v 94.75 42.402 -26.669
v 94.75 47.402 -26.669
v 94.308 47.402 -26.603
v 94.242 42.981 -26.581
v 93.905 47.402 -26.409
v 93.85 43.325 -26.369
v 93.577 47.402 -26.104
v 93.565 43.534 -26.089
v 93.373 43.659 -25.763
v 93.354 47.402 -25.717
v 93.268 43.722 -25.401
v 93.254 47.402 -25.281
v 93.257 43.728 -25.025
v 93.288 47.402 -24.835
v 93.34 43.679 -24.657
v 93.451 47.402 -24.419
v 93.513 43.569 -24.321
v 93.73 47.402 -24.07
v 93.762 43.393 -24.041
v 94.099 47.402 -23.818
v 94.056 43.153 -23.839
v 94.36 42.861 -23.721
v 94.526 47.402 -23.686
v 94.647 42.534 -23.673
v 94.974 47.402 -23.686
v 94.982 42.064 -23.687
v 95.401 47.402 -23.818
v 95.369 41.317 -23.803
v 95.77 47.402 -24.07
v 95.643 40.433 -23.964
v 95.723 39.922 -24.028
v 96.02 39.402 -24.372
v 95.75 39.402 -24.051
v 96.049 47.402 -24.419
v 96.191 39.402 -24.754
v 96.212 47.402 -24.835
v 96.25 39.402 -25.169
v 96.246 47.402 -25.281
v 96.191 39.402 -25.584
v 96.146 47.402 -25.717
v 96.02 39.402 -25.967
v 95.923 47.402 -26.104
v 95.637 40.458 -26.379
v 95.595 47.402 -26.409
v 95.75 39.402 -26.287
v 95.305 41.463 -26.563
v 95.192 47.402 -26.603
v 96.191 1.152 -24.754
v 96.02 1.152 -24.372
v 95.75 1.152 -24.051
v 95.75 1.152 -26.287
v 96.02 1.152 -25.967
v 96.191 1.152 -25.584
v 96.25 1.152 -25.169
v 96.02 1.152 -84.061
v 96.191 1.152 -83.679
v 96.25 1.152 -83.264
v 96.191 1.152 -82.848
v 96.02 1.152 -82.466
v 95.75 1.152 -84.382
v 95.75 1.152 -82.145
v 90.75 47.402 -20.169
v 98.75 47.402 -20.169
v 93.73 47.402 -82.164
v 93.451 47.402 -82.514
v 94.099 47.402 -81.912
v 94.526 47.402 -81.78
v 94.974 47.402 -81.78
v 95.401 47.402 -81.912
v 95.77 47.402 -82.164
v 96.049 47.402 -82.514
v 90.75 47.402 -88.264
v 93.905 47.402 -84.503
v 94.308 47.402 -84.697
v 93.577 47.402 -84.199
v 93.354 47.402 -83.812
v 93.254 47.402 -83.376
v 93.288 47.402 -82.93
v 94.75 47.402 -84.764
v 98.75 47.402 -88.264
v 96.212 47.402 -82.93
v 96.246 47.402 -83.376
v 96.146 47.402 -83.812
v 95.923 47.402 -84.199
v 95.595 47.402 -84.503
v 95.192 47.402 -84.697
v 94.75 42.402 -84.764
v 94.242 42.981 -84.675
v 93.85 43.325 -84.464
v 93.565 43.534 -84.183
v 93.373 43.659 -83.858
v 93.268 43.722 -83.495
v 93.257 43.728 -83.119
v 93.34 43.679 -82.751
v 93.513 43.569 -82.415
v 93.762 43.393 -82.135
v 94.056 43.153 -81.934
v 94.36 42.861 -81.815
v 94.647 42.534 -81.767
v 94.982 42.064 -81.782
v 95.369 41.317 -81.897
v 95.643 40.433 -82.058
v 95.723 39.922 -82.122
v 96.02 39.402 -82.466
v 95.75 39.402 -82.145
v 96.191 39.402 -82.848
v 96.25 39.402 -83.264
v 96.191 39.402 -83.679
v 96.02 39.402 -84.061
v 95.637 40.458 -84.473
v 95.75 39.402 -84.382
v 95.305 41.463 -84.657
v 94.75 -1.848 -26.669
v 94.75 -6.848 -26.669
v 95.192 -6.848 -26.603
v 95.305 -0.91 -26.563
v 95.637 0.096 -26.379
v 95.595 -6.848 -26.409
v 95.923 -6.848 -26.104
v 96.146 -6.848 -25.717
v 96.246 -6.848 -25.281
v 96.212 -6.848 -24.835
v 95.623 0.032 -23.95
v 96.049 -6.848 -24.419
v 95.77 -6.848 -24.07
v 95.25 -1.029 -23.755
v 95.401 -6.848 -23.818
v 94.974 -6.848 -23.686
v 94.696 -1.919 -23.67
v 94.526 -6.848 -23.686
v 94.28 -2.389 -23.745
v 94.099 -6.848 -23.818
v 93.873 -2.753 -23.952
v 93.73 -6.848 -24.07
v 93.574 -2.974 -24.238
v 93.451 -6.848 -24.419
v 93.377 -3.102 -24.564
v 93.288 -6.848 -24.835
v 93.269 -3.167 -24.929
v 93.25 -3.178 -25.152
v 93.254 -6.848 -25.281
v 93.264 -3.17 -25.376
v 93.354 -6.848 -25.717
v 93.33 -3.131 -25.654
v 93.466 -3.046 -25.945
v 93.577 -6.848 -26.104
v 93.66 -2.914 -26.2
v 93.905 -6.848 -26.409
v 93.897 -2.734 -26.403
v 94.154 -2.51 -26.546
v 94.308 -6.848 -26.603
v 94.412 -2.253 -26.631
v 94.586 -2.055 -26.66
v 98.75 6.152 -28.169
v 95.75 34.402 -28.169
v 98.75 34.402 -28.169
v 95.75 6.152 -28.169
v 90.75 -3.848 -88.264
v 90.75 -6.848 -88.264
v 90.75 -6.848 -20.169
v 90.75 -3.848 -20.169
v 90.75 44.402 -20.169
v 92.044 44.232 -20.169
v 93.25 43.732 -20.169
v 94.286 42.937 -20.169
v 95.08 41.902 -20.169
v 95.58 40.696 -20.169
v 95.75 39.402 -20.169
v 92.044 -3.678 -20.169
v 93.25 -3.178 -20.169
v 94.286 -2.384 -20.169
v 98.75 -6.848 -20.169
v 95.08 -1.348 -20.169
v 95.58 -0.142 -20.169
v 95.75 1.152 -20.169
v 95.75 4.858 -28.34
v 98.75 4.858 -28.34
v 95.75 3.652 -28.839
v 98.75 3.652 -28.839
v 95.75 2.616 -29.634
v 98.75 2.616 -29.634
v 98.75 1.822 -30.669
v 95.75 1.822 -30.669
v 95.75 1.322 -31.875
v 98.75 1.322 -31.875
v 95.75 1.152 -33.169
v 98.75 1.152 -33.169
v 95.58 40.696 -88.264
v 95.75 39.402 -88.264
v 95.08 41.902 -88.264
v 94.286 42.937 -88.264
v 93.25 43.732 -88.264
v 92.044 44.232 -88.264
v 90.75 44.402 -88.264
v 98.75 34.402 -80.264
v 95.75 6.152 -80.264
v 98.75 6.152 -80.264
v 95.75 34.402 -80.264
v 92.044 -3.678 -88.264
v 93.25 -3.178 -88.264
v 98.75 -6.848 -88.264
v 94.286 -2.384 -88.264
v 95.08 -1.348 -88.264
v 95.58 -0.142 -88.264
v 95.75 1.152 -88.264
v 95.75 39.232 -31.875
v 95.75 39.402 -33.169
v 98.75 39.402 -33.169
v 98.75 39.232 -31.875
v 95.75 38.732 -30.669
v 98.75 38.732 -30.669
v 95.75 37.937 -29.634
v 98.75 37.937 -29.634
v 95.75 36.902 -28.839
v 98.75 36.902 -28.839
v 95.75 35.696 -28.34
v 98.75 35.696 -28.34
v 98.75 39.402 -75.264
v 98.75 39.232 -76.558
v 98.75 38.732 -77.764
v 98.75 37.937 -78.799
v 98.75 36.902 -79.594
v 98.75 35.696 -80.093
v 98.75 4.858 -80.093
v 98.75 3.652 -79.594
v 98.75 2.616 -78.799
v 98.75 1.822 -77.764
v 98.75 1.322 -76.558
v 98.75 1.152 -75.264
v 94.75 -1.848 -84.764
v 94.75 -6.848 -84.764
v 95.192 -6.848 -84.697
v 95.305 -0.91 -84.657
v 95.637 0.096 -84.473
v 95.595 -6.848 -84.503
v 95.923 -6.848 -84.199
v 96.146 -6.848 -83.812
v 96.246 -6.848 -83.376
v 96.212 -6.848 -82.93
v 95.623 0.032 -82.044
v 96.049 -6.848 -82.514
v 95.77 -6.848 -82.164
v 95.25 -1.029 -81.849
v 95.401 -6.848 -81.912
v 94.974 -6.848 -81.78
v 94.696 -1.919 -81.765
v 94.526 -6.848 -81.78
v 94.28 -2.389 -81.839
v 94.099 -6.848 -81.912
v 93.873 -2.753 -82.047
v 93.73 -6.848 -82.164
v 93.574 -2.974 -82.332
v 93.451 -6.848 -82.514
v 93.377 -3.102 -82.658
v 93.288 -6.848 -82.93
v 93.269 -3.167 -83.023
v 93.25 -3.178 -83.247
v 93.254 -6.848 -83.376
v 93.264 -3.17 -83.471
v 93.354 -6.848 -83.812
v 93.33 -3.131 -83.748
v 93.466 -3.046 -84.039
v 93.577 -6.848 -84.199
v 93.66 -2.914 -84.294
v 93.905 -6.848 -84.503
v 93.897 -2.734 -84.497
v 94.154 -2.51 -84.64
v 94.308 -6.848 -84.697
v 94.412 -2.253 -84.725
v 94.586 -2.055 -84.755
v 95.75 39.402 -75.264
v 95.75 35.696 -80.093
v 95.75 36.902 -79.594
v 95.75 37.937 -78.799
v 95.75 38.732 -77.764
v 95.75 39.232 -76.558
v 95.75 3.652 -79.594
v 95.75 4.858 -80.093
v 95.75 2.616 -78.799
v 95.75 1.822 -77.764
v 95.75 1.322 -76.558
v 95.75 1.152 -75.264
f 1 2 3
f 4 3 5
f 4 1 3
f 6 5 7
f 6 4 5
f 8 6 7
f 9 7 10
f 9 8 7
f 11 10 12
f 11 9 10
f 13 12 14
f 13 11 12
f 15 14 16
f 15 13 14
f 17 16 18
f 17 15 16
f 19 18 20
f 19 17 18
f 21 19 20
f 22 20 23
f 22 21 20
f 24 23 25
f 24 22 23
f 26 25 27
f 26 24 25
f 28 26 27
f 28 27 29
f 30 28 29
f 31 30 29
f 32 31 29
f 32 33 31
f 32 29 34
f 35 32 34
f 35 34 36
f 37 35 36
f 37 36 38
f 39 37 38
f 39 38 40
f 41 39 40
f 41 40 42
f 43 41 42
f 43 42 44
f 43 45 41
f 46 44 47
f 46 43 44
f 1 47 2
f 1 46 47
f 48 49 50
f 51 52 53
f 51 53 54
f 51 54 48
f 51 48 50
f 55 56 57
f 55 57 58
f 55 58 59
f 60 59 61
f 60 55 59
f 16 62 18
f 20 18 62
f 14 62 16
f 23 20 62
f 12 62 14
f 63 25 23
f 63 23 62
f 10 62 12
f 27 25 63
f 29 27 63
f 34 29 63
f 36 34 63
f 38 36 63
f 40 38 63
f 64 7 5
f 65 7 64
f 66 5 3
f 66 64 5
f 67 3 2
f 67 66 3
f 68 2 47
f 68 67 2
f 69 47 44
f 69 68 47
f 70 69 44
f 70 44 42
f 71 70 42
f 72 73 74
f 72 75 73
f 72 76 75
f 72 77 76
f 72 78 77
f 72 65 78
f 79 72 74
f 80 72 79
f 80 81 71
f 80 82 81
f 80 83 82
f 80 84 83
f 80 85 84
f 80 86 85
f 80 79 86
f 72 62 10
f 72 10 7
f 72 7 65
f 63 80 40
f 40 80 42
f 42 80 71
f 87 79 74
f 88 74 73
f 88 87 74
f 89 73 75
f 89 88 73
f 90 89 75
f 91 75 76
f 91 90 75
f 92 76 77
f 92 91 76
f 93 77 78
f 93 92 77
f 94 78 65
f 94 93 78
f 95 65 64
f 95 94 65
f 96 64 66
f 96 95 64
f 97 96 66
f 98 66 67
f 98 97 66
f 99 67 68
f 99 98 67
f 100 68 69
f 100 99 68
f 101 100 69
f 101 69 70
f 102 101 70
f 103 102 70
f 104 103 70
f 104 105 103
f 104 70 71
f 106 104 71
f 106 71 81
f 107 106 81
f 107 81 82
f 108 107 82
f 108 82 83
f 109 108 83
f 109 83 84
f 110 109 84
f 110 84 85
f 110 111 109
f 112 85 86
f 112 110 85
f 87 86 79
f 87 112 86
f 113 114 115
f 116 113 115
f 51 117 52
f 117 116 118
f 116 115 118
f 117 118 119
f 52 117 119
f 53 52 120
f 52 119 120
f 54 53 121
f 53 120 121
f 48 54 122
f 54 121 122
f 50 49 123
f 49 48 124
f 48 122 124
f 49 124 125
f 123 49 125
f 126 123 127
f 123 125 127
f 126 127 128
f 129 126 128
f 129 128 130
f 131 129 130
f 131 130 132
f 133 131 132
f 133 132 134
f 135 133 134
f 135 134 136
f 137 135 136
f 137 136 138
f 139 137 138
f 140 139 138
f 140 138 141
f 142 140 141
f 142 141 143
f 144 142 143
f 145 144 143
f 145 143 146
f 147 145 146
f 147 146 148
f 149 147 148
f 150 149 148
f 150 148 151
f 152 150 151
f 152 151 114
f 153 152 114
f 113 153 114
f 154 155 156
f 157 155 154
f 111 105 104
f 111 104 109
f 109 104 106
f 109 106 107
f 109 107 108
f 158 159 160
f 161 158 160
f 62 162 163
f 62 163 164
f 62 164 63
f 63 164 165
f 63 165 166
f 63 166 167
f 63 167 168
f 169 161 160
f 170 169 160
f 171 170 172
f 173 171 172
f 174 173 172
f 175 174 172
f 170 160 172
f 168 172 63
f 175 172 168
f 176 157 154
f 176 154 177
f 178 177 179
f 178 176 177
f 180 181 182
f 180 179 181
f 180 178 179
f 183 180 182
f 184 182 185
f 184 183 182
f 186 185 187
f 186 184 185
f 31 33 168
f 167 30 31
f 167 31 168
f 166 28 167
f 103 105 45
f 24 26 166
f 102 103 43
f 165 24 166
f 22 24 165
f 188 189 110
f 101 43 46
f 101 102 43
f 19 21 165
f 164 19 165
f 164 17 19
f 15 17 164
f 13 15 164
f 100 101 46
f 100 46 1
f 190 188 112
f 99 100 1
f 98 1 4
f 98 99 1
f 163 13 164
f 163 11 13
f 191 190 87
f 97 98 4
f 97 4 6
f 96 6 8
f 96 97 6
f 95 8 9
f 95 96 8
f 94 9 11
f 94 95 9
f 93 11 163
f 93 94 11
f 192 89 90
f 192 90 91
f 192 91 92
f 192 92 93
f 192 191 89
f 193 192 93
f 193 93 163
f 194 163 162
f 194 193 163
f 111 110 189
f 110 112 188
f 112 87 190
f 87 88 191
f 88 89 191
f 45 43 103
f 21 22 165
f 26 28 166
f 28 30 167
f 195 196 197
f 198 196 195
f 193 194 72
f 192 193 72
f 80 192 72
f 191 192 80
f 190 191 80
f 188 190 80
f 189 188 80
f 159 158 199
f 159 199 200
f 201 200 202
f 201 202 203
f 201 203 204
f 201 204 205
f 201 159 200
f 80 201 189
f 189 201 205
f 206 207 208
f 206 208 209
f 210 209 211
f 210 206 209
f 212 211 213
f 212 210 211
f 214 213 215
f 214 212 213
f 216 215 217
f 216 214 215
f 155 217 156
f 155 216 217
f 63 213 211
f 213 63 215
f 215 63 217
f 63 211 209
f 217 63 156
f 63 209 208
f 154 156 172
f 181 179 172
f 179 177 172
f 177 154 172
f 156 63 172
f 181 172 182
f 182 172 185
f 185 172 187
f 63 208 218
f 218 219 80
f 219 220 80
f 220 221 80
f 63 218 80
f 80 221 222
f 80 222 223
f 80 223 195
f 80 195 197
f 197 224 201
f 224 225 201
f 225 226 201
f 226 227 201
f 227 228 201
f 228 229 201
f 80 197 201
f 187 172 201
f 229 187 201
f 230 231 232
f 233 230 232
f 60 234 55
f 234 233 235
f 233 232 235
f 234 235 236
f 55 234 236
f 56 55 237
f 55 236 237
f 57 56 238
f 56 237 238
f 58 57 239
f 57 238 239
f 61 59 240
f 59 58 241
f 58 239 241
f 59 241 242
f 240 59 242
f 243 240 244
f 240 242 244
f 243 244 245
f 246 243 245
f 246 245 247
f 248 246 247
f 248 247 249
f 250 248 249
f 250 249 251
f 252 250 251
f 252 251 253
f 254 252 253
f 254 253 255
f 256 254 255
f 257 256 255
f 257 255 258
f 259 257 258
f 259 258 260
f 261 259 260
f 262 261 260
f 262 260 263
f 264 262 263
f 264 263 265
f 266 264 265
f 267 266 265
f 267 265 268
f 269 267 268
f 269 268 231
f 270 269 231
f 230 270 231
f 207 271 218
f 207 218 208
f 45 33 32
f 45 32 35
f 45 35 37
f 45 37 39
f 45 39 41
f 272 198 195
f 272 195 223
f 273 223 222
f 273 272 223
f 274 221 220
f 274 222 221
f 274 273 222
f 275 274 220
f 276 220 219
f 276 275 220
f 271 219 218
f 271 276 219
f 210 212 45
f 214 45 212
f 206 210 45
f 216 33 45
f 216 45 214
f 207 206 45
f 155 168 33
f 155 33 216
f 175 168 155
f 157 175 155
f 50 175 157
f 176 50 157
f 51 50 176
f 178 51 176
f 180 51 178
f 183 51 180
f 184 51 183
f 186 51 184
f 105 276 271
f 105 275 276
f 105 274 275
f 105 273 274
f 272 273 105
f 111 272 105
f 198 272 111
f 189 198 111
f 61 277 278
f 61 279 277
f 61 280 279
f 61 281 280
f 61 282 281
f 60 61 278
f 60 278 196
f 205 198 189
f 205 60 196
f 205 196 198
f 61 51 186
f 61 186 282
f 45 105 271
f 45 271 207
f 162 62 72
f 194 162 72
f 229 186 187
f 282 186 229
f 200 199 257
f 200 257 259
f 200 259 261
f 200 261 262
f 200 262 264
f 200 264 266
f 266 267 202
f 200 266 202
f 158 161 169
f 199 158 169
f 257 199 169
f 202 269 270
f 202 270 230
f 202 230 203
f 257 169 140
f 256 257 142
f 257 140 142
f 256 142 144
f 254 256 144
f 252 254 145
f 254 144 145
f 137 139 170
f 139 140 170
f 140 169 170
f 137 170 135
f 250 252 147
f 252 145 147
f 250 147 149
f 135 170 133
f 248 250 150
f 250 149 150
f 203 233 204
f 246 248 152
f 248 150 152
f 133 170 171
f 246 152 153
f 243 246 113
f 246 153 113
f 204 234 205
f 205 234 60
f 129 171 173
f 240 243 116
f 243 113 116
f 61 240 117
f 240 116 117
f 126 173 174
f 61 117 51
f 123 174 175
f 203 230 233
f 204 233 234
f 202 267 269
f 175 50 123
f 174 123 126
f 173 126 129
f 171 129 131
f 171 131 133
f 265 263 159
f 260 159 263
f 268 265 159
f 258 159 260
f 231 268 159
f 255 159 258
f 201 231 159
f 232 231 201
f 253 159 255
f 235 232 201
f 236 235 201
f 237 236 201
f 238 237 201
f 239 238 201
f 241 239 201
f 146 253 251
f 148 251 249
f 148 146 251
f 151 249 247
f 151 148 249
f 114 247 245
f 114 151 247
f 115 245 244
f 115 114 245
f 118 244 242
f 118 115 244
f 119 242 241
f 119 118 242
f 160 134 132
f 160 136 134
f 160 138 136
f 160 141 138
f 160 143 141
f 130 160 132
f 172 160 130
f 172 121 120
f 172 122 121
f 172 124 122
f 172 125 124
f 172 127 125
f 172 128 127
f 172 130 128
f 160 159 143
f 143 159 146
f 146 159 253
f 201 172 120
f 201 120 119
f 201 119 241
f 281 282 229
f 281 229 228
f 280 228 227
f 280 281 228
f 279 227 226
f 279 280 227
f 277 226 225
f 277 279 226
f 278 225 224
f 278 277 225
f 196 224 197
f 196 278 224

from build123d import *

# Parameters (mm, degrees)
SKETCH1_W                         = 3
SKETCH1_H                         = 68.094259971
MAIN_EXTRUDE_DEPTH                = 54.25
SKETCH2_W                         = 8
SKETCH2_H                         = 68.094259971
TOP_SCREWHOLE_EXTENSION_DEPTH     = 3
SKETCH3_W                         = 8
SKETCH3_H                         = 68.094259971
BOTTOM_SCREWHOLE_EXTENSION_DEPTH  = 3
SCREWHOLE_EXTENSION_FILLETS_5MM_R = 5
SKETCH4_R                         = 1.5
BOTTOM_SCREWHOLES_DEPTH           = 8
TOP_START                         = -8
SKETCH5_R                         = 1.5
TOP_SCREWHOLES_DEPTH              = 8
WEIGHT_REDUCTION_DEPTH            = 101.505676109
WEIGHT_REDUCTION_DEPTH_BACK       = 101.505676109


with BuildPart() as part:
    # Sketch1 → Main extrude (new body)
    with BuildSketch(Plane(origin=(0, -6.84807753, 0), x_dir=(1, 0, 0), z_dir=(0, 1, 0))):
        with Locations((97.25, 54.216388238)):
            Rectangle(SKETCH1_W, SKETCH1_H)
    extrude(amount=MAIN_EXTRUDE_DEPTH)

    # Sketch2 → Top screwhole extension (add)
    with BuildSketch(Plane(origin=(0, 47.40192247, 0), x_dir=(1, 0, 0), z_dir=(0, 1, 0))):
        with Locations((94.75, 54.216388238)):
            Rectangle(SKETCH2_W, SKETCH2_H)
    extrude(amount=-TOP_SCREWHOLE_EXTENSION_DEPTH)

    # Sketch3 → Bottom screwhole extension (add)
    with BuildSketch(Plane.XZ.offset(6.84807753)):
        with Locations((94.75, -54.216388238)):
            Rectangle(SKETCH3_W, SKETCH3_H)
    extrude(amount=-BOTTOM_SCREWHOLE_EXTENSION_DEPTH)

    # Screwhole extension fillets 5mm
    screwhole_extension_fillets_5mm_edges = [part.edges().sort_by_distance(p)[0] for p in [
        (95.75, 44.40192247, -54.216388238),
        (95.75, -3.84807753, -54.216388238),
    ]]
    fillet(screwhole_extension_fillets_5mm_edges, radius=SCREWHOLE_EXTENSION_FILLETS_5MM_R - 0.0001)  # a hair under: the kernel refuses the full size

    # Sketch4 → Bottom screwholes (cut)
    with BuildSketch(Plane.XZ.offset(6.84807753)):
        with Locations(Location((94.75, -25.169258252, 0), (0, 0, 270))):
            Circle(SKETCH4_R)
        with Locations(Location((94.75, -83.263518223, 0), (0, 0, 270))):
            Circle(SKETCH4_R)
    extrude(amount=-BOTTOM_SCREWHOLES_DEPTH, mode=Mode.SUBTRACT)

    # Sketch5 → Top screwholes (cut)
    with BuildSketch(Plane(origin=(0, 47.40192247, 0), x_dir=(1, 0, 0), z_dir=(0, 1, 0)).offset(TOP_START)):
        with Locations(Location((94.75, 25.169258252, 0), (0, 0, 90))):
            Circle(SKETCH5_R)
        with Locations(Location((94.75, 83.263518223, 0), (0, 0, 90))):
            Circle(SKETCH5_R)
    extrude(amount=TOP_SCREWHOLES_DEPTH, mode=Mode.SUBTRACT)

    # Sketch6 → Weight reduction (cut, two sides: drawn at the far end of the back side and taken through both)
    with BuildSketch(Plane(origin=(98.75, 0, 0), x_dir=(0, 0, -1), z_dir=(1, 0, 0)).offset(-WEIGHT_REDUCTION_DEPTH_BACK)):
        with BuildLine():
            Line((28.169258252, 34.40192247), (28.169258252, 6.15192247))
            ThreePointArc((28.169258252, 6.15192247), (29.633724346, 2.616388564), (33.169258252, 1.15192247))
            Line((33.169258252, 1.15192247), (75.263518223, 1.15192247))
            ThreePointArc((75.263518223, 1.15192247), (78.799052129, 2.616388564), (80.263518223, 6.15192247))
            Line((80.263518223, 6.15192247), (80.263518223, 34.40192247))
            ThreePointArc((80.263518223, 34.40192247), (78.799052129, 37.937456376), (75.263518223, 39.40192247))
            Line((75.263518223, 39.40192247), (33.169258252, 39.40192247))
            ThreePointArc((33.169258252, 39.40192247), (29.633724346, 37.937456376), (28.169258252, 34.40192247))
        make_face()
    extrude(amount=WEIGHT_REDUCTION_DEPTH + WEIGHT_REDUCTION_DEPTH_BACK, mode=Mode.SUBTRACT)


solid = part.part
